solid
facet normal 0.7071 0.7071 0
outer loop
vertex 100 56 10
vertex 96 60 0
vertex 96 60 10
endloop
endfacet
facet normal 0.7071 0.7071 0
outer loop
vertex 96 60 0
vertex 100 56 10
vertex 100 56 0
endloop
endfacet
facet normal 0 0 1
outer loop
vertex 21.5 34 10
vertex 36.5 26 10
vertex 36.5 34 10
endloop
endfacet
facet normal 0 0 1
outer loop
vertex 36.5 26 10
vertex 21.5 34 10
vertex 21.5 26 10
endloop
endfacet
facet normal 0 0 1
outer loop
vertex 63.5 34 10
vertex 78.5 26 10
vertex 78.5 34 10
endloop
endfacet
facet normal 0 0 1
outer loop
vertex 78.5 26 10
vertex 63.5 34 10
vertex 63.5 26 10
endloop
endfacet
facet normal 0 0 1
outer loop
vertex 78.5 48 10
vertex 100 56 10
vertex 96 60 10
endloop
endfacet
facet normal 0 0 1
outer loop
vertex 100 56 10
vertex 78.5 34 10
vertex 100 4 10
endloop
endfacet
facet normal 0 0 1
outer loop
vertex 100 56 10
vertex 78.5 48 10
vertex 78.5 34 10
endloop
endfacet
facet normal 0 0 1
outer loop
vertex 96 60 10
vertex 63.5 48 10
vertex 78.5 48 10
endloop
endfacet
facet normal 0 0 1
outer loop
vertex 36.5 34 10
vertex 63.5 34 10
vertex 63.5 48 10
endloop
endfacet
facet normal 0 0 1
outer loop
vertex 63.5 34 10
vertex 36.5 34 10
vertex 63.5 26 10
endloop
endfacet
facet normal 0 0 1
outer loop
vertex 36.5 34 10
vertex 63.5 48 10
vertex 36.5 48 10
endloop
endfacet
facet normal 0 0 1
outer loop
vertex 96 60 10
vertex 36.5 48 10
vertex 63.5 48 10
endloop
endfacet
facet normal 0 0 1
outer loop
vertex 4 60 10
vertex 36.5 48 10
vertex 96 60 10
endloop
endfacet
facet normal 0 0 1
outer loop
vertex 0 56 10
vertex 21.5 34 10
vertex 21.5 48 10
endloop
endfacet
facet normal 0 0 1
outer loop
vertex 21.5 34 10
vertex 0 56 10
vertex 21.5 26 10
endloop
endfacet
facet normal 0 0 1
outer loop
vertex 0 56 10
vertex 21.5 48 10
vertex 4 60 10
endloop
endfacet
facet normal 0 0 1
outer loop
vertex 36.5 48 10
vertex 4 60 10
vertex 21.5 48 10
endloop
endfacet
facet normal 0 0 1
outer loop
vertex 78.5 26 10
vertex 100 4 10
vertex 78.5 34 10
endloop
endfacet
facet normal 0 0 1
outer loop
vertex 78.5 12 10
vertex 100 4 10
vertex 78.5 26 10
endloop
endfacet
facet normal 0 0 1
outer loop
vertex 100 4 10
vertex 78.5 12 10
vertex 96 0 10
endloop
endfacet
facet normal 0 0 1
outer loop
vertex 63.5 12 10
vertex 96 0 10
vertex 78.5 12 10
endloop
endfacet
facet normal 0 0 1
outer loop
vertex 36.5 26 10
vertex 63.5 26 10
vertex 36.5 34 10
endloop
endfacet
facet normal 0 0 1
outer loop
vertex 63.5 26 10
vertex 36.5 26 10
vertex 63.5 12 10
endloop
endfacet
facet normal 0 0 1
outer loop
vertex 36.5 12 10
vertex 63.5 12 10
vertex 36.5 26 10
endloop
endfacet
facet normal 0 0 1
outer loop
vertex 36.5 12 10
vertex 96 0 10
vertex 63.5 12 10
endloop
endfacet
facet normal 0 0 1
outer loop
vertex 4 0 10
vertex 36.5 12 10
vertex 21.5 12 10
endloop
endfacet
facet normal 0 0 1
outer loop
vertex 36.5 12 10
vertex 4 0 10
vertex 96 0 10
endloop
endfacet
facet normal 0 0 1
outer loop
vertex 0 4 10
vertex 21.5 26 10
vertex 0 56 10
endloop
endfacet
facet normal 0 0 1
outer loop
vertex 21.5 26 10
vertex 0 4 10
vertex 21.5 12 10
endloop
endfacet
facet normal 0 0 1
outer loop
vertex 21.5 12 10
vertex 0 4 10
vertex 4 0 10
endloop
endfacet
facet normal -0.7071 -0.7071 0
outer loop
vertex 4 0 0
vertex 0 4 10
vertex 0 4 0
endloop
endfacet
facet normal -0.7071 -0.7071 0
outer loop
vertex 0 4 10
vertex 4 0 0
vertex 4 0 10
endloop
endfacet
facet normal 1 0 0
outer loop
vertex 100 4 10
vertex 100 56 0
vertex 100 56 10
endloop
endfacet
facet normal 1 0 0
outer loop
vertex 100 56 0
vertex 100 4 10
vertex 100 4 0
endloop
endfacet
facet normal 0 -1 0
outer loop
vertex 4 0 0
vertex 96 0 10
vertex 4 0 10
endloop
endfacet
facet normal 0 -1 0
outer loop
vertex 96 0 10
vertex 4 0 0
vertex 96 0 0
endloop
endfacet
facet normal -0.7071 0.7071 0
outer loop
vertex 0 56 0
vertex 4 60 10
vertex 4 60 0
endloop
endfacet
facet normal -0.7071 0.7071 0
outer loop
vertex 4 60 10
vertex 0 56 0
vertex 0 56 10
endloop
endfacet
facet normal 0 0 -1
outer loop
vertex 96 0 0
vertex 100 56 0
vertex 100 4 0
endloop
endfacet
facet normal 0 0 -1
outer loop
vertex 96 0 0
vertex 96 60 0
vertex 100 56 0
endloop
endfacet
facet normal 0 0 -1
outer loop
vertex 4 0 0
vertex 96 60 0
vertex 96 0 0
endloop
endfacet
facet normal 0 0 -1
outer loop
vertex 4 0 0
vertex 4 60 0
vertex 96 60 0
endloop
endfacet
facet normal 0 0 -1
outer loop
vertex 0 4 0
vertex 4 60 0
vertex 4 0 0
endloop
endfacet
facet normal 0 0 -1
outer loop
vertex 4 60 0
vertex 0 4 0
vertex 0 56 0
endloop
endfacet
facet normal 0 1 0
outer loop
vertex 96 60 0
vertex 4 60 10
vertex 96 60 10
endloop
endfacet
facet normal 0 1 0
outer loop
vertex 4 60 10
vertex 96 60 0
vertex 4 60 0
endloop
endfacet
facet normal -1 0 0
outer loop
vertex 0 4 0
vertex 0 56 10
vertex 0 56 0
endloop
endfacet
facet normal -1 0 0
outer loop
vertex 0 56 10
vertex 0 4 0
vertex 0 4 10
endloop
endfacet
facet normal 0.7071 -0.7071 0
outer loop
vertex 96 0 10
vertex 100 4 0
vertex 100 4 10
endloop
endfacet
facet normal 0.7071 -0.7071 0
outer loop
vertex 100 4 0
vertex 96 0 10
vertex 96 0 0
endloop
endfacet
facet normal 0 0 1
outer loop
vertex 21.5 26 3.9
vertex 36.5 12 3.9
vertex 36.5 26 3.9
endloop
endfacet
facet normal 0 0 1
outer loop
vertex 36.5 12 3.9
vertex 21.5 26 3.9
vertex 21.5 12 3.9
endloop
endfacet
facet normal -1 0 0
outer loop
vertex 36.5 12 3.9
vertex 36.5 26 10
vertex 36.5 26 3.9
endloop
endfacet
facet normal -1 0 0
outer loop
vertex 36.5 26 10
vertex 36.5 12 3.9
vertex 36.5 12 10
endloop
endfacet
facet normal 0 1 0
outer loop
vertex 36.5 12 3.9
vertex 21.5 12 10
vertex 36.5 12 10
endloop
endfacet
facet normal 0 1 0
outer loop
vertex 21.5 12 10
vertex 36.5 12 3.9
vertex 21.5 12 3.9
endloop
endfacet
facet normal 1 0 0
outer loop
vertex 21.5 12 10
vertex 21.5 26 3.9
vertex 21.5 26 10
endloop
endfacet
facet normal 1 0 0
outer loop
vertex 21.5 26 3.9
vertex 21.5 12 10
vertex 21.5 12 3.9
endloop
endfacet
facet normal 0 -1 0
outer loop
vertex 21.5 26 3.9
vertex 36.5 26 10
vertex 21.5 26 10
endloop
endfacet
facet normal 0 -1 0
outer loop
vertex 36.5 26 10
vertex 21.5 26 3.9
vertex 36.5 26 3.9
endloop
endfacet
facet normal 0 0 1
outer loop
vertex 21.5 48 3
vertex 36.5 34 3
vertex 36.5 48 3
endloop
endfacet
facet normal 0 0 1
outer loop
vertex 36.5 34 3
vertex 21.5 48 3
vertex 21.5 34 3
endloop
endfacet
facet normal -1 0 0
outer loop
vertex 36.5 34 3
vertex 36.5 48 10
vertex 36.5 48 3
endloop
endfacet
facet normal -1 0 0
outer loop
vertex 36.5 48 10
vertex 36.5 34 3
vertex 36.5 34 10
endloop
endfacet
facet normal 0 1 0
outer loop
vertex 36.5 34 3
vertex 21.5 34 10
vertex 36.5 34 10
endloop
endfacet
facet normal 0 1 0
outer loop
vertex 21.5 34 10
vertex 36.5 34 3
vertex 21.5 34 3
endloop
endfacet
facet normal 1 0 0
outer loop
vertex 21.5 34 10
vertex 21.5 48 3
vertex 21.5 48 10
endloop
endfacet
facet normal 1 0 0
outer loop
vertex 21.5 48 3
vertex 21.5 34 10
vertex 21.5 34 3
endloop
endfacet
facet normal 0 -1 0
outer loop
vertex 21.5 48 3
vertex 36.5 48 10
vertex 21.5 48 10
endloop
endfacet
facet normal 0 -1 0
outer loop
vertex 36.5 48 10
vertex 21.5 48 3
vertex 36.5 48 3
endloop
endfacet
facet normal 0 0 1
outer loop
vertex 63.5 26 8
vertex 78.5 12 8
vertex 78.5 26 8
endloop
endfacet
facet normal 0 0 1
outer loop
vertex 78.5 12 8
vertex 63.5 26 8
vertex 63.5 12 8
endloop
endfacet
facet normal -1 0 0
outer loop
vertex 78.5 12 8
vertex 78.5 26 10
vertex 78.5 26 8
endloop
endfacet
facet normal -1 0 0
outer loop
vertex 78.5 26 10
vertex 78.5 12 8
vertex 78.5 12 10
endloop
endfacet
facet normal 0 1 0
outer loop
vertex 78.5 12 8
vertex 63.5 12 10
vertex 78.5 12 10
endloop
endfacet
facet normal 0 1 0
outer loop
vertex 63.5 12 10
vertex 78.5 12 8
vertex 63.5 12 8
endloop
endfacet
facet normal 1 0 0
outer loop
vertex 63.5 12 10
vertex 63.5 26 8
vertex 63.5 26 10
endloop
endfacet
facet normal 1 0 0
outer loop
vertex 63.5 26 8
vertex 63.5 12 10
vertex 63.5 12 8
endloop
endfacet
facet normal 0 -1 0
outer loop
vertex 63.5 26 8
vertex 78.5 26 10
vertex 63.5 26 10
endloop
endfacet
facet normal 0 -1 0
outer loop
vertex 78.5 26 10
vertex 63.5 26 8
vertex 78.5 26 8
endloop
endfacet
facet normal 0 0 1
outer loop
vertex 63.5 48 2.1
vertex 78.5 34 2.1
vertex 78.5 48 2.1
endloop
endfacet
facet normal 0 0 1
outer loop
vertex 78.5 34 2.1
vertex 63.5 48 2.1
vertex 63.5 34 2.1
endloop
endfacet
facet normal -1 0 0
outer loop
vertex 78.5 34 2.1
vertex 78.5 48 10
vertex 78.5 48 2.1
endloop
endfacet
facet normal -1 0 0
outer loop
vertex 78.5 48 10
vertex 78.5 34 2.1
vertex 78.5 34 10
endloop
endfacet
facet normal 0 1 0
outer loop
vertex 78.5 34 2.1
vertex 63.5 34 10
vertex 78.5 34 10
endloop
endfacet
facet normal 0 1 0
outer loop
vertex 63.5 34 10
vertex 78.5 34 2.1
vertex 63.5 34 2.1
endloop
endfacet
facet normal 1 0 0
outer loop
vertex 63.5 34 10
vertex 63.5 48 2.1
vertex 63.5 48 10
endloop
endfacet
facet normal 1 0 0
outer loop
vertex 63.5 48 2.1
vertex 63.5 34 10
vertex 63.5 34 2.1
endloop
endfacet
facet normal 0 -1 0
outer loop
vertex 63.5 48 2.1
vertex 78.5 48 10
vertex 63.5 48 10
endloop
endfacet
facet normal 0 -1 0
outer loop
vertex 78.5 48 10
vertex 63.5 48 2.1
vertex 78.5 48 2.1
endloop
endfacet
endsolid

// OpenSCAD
$fn = 32;

// ----------------------------------------------------------------------
// Windowed plate: 4 voids, 100 x 60 x 10 mm
// ----------------------------------------------------------------------

// --- parameters (mm) ---
plate_l = 100;            // plate length, X
plate_w = 60;             // plate width, Y
plate_t = 10;             // plate thickness, Z
edge_margin = 8;          // wall from the plate edge to any window
win_l = 15;               // pocket length
win_w = 14;               // pocket width
pitch_x = 42;             // grid pitch along X
pitch_y = 22;             // grid pitch along Y
depth_1 = 6.1;            // depth of void 1 (full thickness = through)
depth_2 = 7;              // depth of void 2 (full thickness = through)
depth_3 = 2;              // depth of void 3 (full thickness = through)
depth_4 = 7.9;            // depth of void 4 (full thickness = through)
corner_c = 4;             // corner chamfer of the plate
fit_tol = 0.1;            // declared fit tolerance (prompt contract)
free_tol = 0.3;           // declared free tolerance (prompt contract)

profile = [[4, 0], [96, 0], [100, 4], [100, 56], [96, 60], [4, 60], [0, 56], [0, 4]];  // primary outline, 8 points, counter clockwise
void_1 = [[21.5, 12], [36.5, 12], [36.5, 26], [21.5, 26]];  // pocket at grid node 0,0, 4 points
void_2 = [[21.5, 34], [36.5, 34], [36.5, 48], [21.5, 48]];  // pocket at grid node 0,1, 4 points
void_3 = [[63.5, 12], [78.5, 12], [78.5, 26], [63.5, 26]];  // pocket at grid node 1,0, 4 points
void_4 = [[63.5, 34], [78.5, 34], [78.5, 48], [63.5, 48]];  // pocket at grid node 1,1, 4 points

// --- the one profile operation ---
difference() {
  linear_extrude(height = plate_t) polygon(points = profile);
  translate([0, 0, plate_t - depth_1])
    linear_extrude(height = depth_1 + 1) polygon(points = void_1);
  translate([0, 0, plate_t - depth_2])
    linear_extrude(height = depth_2 + 1) polygon(points = void_2);
  translate([0, 0, plate_t - depth_3])
    linear_extrude(height = depth_3 + 1) polygon(points = void_3);
  translate([0, 0, plate_t - depth_4])
    linear_extrude(height = depth_4 + 1) polygon(points = void_4);
}
